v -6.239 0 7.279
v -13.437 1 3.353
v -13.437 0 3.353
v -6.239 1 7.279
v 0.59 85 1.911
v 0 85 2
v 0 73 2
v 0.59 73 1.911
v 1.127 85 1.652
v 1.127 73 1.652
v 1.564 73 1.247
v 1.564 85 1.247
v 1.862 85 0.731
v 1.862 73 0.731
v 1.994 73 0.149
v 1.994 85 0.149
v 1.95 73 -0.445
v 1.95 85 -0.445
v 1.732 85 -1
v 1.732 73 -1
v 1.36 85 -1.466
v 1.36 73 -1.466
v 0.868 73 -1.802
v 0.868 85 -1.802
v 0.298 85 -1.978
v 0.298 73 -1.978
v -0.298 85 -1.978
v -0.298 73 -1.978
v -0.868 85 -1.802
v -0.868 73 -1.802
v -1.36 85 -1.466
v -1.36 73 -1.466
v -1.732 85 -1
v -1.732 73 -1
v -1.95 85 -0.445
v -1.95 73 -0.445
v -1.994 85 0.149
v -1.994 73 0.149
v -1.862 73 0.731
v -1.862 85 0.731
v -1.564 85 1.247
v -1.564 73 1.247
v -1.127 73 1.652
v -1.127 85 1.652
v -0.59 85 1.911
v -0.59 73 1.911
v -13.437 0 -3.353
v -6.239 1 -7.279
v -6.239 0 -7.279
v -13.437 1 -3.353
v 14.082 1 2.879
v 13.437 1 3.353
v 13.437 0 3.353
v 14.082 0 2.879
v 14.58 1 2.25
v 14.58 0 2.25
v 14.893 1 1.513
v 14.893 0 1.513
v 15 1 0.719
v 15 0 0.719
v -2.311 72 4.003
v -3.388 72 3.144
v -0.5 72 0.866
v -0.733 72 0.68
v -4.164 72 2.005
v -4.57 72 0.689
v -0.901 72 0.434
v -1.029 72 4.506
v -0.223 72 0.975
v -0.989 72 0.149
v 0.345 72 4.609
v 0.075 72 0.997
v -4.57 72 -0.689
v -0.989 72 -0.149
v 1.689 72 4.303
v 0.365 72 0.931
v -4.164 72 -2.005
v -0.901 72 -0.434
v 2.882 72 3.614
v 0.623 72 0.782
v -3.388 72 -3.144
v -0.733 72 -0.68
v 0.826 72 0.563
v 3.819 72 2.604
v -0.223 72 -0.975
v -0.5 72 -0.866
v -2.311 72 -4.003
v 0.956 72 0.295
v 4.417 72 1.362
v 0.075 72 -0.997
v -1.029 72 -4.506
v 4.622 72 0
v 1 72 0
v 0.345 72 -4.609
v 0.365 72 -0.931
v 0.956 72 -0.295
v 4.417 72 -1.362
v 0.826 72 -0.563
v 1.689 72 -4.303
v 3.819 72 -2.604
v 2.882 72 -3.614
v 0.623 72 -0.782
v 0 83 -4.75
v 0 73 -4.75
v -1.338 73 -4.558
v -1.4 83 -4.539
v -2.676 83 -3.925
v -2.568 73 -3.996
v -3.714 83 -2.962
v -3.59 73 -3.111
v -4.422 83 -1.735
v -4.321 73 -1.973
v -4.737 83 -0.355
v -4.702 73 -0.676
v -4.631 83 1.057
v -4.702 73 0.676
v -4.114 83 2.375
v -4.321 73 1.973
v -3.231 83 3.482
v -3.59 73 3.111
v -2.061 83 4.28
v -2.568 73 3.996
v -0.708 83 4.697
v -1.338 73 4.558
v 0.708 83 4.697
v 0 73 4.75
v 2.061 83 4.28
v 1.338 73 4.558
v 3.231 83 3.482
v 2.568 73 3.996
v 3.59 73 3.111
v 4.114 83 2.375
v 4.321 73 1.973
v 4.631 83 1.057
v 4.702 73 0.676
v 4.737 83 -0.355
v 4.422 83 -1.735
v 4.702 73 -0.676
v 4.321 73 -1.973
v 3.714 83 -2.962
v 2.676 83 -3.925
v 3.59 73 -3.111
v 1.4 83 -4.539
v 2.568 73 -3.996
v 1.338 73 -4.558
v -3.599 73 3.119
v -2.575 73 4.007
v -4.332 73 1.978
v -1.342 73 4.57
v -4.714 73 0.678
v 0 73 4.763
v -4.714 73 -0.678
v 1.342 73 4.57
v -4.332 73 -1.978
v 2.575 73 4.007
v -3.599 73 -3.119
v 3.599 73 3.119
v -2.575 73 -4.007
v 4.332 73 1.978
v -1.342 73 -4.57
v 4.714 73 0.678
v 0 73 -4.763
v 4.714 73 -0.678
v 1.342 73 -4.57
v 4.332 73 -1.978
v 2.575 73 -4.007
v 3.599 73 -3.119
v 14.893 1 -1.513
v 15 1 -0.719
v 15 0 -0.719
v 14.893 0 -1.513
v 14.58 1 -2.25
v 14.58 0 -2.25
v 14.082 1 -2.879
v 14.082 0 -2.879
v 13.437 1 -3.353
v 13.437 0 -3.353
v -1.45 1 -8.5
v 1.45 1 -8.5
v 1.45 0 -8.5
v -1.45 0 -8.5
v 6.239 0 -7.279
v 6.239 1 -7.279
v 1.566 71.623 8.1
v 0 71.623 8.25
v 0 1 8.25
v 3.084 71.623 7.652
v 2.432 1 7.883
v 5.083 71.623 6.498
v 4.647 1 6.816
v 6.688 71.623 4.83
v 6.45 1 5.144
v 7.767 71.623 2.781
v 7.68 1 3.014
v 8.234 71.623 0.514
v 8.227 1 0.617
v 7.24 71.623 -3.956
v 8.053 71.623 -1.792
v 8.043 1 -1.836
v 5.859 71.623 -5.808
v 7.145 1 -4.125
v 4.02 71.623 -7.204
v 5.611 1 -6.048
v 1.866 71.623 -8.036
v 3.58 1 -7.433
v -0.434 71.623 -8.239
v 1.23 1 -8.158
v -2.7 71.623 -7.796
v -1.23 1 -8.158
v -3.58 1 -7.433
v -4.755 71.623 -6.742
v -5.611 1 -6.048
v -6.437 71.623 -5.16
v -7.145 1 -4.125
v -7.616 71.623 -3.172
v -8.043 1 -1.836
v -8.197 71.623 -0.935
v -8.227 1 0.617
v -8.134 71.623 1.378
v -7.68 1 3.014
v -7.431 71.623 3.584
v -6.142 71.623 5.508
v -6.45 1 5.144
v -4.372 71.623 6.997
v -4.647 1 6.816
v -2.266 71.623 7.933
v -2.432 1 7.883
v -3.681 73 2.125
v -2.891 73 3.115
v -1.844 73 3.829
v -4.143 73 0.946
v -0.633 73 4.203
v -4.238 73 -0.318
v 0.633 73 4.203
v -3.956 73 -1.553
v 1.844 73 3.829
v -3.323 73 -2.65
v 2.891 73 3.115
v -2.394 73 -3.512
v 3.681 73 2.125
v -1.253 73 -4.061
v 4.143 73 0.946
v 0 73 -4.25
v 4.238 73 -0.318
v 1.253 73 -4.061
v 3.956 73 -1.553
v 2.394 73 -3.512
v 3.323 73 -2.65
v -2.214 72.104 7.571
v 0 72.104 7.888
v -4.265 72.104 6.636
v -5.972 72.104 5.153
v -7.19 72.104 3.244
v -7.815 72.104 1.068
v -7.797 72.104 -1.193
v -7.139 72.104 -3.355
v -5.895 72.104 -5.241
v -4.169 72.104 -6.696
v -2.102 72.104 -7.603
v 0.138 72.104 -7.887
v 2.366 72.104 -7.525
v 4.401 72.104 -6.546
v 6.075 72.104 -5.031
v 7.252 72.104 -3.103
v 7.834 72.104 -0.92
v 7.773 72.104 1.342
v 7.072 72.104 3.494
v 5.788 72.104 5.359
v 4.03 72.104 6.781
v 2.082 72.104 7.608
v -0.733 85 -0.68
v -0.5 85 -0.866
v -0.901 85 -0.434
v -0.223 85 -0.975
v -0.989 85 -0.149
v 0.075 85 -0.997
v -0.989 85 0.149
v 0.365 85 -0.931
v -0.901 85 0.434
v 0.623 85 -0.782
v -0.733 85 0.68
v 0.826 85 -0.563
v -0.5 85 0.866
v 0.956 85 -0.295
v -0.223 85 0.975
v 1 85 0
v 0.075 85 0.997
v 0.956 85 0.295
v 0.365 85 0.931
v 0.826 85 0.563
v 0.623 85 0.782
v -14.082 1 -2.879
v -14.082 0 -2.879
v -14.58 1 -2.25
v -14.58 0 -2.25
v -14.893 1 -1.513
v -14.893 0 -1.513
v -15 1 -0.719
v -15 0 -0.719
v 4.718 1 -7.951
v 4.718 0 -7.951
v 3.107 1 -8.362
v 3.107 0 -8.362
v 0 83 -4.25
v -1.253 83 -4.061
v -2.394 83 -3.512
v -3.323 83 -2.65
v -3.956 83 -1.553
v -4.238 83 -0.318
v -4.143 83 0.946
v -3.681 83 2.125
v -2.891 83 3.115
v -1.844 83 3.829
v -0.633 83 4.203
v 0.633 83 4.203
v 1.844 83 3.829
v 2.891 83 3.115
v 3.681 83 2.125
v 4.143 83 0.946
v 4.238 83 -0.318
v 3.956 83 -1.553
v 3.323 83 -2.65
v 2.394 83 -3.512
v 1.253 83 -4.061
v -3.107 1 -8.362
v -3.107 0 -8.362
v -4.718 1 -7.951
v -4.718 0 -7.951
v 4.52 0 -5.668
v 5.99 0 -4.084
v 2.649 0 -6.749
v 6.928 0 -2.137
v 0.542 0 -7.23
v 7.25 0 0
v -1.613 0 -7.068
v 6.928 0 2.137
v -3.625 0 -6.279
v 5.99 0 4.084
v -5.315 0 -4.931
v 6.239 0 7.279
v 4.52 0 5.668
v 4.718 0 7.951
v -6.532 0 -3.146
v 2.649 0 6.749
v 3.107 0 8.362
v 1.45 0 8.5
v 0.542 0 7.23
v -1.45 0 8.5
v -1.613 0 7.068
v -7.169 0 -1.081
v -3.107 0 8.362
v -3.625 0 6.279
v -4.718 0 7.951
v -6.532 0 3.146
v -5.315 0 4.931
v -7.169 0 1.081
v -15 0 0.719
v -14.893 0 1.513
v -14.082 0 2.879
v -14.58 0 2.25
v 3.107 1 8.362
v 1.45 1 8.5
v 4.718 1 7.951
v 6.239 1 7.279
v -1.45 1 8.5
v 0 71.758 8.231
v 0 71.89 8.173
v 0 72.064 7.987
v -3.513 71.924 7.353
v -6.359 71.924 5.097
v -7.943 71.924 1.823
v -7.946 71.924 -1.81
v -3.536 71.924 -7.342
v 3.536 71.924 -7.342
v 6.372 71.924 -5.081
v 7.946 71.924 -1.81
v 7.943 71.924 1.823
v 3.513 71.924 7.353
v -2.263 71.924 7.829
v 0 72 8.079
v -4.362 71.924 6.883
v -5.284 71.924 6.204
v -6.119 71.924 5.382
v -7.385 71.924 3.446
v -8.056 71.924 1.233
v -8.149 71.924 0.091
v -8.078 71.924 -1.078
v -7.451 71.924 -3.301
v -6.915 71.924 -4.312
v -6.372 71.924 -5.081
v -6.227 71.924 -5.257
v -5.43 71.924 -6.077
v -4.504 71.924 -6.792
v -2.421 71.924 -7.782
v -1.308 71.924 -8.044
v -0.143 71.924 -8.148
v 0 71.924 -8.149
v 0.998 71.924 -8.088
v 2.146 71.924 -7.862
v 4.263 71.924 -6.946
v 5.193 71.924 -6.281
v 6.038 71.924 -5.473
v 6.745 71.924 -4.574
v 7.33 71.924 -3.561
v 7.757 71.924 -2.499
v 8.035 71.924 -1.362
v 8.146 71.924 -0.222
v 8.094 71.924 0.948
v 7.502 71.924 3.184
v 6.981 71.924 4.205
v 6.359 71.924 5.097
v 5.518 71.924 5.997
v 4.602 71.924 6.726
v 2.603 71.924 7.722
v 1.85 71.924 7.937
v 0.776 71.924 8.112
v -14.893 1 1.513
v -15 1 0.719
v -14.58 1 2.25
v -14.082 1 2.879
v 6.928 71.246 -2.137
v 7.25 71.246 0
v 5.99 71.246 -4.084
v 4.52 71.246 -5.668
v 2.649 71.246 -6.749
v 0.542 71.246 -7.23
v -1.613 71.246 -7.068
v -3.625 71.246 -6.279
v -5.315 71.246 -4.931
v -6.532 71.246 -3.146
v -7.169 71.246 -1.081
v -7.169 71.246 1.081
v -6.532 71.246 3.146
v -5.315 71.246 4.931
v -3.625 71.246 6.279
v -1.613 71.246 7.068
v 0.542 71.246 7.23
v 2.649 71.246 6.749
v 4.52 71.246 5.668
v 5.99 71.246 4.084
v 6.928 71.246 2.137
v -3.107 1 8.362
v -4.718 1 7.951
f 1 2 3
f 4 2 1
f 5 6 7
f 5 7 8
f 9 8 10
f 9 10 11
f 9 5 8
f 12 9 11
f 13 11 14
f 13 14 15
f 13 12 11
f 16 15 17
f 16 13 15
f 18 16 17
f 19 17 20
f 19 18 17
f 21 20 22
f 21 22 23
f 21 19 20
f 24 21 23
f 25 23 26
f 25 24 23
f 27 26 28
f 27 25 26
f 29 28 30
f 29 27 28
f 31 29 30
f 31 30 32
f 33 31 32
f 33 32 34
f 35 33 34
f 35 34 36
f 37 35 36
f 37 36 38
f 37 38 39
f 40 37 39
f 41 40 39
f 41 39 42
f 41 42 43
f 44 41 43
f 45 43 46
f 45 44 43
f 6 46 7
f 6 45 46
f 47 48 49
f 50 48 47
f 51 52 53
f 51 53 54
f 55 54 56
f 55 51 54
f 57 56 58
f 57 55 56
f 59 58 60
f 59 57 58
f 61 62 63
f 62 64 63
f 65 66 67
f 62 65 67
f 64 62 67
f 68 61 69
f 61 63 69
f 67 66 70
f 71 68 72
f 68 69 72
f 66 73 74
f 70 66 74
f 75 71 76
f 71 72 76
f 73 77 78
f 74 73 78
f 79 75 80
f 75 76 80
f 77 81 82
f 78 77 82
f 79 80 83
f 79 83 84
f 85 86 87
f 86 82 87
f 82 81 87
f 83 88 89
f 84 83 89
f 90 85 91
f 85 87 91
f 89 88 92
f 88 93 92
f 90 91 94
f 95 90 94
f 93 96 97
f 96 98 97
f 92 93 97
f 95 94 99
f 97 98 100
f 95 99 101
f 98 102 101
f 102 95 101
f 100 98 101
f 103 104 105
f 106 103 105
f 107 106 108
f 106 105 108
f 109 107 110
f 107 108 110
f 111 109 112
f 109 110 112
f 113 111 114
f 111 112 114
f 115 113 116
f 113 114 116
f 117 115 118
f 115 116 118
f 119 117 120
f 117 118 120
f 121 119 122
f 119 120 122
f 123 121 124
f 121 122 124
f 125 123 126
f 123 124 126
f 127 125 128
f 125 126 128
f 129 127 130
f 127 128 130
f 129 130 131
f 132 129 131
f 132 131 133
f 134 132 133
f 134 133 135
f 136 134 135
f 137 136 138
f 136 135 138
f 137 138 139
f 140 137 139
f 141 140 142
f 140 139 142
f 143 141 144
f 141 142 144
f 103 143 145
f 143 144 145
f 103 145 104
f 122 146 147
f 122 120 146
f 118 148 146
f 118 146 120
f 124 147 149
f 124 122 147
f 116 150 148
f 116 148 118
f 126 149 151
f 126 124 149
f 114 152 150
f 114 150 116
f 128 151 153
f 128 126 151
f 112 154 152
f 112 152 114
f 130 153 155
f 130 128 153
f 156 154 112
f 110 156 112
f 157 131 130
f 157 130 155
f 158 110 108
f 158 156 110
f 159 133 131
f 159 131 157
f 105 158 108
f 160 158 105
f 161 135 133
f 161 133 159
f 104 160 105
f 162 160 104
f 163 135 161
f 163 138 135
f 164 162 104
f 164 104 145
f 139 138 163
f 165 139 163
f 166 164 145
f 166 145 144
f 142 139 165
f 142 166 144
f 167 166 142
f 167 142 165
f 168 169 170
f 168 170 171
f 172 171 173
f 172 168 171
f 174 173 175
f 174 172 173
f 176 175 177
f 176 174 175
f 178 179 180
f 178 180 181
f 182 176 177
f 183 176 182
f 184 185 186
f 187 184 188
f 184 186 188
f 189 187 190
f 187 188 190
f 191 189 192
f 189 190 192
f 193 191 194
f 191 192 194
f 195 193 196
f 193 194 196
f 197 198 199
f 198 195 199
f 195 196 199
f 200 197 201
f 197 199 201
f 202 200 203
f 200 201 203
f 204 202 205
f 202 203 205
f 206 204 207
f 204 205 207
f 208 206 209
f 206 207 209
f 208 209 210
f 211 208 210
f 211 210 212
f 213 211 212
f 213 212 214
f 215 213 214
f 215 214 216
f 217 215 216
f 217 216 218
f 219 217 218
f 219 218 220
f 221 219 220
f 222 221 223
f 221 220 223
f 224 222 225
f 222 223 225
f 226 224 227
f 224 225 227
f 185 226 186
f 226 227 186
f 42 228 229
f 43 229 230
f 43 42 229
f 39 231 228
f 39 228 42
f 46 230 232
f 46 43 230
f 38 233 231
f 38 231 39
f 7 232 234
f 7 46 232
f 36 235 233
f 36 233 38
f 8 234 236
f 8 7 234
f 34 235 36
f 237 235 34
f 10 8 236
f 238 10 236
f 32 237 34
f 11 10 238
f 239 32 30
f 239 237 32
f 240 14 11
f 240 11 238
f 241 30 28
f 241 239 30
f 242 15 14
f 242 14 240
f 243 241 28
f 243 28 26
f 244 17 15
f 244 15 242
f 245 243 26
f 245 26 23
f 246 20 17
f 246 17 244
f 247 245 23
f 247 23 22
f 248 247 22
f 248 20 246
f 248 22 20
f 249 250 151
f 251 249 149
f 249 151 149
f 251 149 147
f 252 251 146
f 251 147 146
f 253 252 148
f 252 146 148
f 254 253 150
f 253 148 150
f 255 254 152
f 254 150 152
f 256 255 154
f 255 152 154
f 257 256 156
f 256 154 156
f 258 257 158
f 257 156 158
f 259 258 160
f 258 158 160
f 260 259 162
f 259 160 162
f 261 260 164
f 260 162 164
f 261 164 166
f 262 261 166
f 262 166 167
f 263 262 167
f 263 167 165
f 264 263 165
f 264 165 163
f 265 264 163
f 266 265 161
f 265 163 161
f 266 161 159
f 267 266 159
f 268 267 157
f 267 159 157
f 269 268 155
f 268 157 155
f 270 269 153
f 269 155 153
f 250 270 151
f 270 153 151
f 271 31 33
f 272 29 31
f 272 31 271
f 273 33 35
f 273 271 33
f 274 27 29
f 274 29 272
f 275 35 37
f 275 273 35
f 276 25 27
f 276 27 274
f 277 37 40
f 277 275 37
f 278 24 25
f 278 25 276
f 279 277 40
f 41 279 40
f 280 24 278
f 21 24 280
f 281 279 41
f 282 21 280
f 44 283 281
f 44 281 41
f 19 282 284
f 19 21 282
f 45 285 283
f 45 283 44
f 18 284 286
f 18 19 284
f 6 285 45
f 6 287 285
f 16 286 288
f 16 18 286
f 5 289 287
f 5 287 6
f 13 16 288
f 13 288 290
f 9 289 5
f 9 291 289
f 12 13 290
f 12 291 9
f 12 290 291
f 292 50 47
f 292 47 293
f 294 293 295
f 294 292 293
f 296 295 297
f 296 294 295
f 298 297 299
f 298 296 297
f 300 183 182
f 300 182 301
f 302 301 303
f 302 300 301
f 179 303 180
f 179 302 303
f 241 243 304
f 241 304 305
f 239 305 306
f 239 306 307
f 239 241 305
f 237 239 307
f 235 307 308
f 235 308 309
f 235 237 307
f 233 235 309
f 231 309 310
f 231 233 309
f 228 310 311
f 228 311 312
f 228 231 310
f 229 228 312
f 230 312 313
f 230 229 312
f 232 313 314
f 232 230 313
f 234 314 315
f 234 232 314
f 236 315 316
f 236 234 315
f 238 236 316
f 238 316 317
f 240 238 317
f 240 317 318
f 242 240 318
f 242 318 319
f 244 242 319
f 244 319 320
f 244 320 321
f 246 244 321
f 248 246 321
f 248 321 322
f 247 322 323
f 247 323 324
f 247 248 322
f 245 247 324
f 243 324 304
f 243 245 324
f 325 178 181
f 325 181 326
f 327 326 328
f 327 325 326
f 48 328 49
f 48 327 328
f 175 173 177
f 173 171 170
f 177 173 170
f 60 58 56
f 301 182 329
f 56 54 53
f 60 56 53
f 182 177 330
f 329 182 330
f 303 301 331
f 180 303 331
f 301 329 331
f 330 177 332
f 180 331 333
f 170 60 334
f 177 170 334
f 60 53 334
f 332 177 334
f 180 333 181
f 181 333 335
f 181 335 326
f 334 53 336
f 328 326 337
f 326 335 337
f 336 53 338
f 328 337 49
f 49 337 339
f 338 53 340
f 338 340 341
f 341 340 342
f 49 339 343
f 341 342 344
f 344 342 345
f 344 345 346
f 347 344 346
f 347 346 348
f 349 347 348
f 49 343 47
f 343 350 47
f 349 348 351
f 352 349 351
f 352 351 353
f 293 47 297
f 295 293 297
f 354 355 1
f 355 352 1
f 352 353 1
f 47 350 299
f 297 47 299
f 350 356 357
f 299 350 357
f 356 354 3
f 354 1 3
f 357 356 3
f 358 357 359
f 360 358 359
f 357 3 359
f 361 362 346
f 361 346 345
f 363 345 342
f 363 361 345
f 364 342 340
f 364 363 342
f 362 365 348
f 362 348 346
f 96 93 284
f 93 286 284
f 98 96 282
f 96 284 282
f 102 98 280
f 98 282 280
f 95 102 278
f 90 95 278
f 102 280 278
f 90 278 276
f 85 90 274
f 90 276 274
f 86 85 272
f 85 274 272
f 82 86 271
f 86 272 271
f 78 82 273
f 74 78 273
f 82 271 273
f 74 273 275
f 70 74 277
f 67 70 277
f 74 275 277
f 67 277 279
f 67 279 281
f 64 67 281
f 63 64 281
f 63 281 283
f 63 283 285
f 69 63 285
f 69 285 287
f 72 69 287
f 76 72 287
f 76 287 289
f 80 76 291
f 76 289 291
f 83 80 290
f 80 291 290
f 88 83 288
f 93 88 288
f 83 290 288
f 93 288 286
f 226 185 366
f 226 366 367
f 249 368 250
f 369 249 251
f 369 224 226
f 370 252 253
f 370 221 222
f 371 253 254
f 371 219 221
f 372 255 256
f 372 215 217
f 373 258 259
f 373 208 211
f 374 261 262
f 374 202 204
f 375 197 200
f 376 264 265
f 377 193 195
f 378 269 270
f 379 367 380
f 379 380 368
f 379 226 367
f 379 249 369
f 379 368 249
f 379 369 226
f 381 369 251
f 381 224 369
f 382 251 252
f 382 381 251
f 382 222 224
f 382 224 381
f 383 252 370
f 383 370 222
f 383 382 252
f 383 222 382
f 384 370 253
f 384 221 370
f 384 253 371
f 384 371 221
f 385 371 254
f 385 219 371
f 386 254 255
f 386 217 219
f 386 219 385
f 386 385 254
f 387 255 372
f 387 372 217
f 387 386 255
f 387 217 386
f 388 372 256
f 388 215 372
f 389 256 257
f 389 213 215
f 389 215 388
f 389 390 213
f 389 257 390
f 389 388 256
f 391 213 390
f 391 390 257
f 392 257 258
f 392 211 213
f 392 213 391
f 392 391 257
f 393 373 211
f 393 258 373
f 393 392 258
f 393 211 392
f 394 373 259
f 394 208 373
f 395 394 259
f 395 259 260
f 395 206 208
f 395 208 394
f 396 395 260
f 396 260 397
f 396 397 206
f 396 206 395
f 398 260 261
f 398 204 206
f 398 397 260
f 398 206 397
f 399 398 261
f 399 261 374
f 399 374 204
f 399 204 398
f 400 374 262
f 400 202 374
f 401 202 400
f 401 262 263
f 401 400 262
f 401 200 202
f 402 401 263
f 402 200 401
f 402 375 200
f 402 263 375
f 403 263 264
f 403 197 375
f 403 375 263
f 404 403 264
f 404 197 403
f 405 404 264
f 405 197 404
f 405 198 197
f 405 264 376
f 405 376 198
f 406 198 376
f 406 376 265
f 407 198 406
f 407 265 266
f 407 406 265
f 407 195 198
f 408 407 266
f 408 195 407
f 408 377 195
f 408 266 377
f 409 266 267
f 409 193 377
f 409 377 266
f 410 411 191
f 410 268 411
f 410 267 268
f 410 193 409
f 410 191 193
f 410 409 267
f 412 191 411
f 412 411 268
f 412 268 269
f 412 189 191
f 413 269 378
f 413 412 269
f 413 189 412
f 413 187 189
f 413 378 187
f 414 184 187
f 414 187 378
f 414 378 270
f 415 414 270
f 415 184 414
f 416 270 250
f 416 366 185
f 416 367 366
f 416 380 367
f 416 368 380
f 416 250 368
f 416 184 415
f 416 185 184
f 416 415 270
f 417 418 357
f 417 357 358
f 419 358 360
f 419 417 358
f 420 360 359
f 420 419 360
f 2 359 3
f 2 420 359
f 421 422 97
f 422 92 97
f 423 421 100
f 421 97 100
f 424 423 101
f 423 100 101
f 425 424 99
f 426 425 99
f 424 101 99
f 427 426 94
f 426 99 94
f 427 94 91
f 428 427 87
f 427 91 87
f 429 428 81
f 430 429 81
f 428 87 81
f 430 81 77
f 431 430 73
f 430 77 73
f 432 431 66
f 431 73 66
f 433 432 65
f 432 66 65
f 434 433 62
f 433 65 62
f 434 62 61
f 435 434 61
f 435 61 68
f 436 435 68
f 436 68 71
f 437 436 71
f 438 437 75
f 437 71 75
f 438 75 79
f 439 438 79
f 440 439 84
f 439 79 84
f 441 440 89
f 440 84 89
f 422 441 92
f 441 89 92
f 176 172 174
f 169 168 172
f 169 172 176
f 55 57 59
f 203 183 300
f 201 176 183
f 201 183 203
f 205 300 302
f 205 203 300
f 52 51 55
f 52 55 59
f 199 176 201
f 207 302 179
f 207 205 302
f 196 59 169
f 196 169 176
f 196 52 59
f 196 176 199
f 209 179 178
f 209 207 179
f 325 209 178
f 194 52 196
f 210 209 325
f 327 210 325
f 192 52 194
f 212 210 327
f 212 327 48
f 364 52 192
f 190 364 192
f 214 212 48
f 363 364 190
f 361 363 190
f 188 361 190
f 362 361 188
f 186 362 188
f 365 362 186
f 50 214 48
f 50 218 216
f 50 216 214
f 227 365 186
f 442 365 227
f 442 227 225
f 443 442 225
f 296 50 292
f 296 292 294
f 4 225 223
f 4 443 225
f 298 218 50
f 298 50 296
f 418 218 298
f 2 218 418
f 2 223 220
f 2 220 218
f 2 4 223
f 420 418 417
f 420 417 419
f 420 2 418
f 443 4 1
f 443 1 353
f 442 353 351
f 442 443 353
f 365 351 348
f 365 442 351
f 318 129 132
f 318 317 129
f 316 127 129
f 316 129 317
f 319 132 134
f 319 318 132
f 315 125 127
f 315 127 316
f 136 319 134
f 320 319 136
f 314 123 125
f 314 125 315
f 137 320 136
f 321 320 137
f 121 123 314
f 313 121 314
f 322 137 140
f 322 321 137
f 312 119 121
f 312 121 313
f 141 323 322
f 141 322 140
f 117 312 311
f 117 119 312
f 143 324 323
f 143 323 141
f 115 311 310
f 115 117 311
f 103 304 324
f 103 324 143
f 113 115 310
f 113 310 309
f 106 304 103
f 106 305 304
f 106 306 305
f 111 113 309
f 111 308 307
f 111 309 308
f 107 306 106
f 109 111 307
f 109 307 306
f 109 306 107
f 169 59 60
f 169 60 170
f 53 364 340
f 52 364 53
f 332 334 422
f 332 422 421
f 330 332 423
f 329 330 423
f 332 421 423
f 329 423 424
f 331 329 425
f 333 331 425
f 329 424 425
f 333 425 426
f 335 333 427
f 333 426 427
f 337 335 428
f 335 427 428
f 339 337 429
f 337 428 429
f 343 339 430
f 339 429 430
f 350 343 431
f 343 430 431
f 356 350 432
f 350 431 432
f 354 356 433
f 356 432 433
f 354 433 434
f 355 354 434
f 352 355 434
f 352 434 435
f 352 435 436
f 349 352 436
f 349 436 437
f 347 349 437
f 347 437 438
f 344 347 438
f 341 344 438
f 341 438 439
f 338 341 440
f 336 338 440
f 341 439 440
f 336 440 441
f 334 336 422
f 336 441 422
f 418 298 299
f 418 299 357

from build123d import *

# Parameters (mm, degrees)
SKETCH1_R           = 8.25
BOSS_EXTRUDE1_DEPTH = 85
SKETCH2_OUTSIDE_W   = 36.128
SKETCH2_OUTSIDE_H   = 36.128
SKETCH2_OUTSIDE_R   = 2
CUT_EXTRUDE1_DEPTH  = 12
SKETCH3_R           = 4.75
SKETCH3_R_2         = 4.25
BOSS_EXTRUDE2_DEPTH = 10
CHAMFER1_SIZE       = 1
CHAMFER1_SIZE2      = 3.487414444
FILLET1_R           = 0.5
BOSS_EXTRUDE3_START = -1
SKETCH4_R           = 7.25
BOSS_EXTRUDE3_DEPTH = 1


# Read off the part's stored shape, not the designer's step: Shell1
with BuildPart() as part:
    # Sketch1 → Boss-Extrude1 (new body)
    with BuildSketch(Plane(origin=(0, 0, 0), x_dir=(1, 0, 0), z_dir=(0, 1, 0))):
        with Locations(Location((0, 0, 0), (0, 0, 270))):
            Circle(SKETCH1_R)
    extrude(amount=BOSS_EXTRUDE1_DEPTH)

    # Sketch2 outside → Cut-Extrude1 (cut)
    with BuildSketch(Plane(origin=(0, 85, 0), x_dir=(1, 0, 0), z_dir=(0, 1, 0))):
        Rectangle(SKETCH2_OUTSIDE_W, SKETCH2_OUTSIDE_H)
        with Locations(Location((0, 0, 0), (0, 0, 270))):
            Circle(SKETCH2_OUTSIDE_R, mode=Mode.SUBTRACT)
    extrude(amount=-CUT_EXTRUDE1_DEPTH, mode=Mode.SUBTRACT)

    # Sketch3 → Boss-Extrude2 (add)
    with BuildSketch(Plane(origin=(0, 73, 0), x_dir=(1, 0, 0), z_dir=(0, 1, 0))):
        with Locations(Location((0, 0, 0), (0, 0, 90))):
            Circle(SKETCH3_R)
        with Locations(Location((0, 0, 0), (0, 0, 90))):
            Circle(SKETCH3_R_2, mode=Mode.SUBTRACT)
    extrude(amount=BOSS_EXTRUDE2_DEPTH)

    # Chamfer1
    chamfer1_edges = [part.edges().sort_by_distance(p)[0] for p in [
        (0, 73, -8.25),
    ]]
    chamfer1_side = [part.faces().sort_by_distance(p)[0] for p in [
        (0, 36.5, -8.25),
    ]]
    chamfer(chamfer1_edges, length=CHAMFER1_SIZE, length2=CHAMFER1_SIZE2, reference=chamfer1_side[0])

    # Fillet1
    fillet1_edges = [part.edges().sort_by_distance(p)[0] for p in [
        (0, 72, -8.25),
    ]]
    fillet(fillet1_edges, radius=FILLET1_R)

    # Shell1 outline → Shell1 (revolve, cut)
    with BuildSketch(Plane.XY):
        Polygon((7.25, 0), (7.25, 71.24644595), (4.622044721, 72), (1, 72), (1, 85), (0, 85), (0, 0), align=None)
    revolve(axis=Axis((0, 0, 0), (0, 1, 0)), mode=Mode.SUBTRACT)

    # Sketch4 → Boss-Extrude3 (add)
    with BuildSketch(Plane.XZ.offset(BOSS_EXTRUDE3_START)):
        with BuildLine():
            Line((-13.436556392, 3.352787423), (-6.238581163, 7.278955729))
            ThreePointArc((-6.238581163, 7.278955729), (-3.92093447, 8.189931818), (-1.450059856, 8.5))
            Line((-1.450059856, 8.5), (1.450059856, 8.5))
            ThreePointArc((1.450059856, 8.5), (3.92093447, 8.189931818), (6.238581163, 7.278955729))
            Line((6.238581163, 7.278955729), (13.436556392, 3.352787423))
            ThreePointArc((13.436556392, 3.352787423), (14.579696608, 2.250493995), (15, 0.719100704))
            Line((15, 0.719100704), (15, -0.719100704))
            ThreePointArc((15, -0.719100704), (14.579696608, -2.250493995), (13.436556392, -3.352787423))
            Line((13.436556392, -3.352787423), (6.238581163, -7.278955729))
            ThreePointArc((6.238581163, -7.278955729), (3.92093447, -8.189931818), (1.450059856, -8.5))
            Line((1.450059856, -8.5), (-1.450059856, -8.5))
            ThreePointArc((-1.450059856, -8.5), (-3.92093447, -8.189931818), (-6.238581163, -7.278955729))
            Line((-6.238581163, -7.278955729), (-13.436556392, -3.352787423))
            ThreePointArc((-13.436556392, -3.352787423), (-14.579696608, -2.250493995), (-15, -0.719100704))
            Line((-15, -0.719100704), (-15, 0.719100704))
            ThreePointArc((-15, 0.719100704), (-14.579696608, 2.250493995), (-13.436556392, 3.352787423))
        make_face()
        with Locations(Location((0, 0, 0), (0, 0, 270))):
            Circle(SKETCH4_R, mode=Mode.SUBTRACT)
    extrude(amount=BOSS_EXTRUDE3_DEPTH)


solid = part.part
